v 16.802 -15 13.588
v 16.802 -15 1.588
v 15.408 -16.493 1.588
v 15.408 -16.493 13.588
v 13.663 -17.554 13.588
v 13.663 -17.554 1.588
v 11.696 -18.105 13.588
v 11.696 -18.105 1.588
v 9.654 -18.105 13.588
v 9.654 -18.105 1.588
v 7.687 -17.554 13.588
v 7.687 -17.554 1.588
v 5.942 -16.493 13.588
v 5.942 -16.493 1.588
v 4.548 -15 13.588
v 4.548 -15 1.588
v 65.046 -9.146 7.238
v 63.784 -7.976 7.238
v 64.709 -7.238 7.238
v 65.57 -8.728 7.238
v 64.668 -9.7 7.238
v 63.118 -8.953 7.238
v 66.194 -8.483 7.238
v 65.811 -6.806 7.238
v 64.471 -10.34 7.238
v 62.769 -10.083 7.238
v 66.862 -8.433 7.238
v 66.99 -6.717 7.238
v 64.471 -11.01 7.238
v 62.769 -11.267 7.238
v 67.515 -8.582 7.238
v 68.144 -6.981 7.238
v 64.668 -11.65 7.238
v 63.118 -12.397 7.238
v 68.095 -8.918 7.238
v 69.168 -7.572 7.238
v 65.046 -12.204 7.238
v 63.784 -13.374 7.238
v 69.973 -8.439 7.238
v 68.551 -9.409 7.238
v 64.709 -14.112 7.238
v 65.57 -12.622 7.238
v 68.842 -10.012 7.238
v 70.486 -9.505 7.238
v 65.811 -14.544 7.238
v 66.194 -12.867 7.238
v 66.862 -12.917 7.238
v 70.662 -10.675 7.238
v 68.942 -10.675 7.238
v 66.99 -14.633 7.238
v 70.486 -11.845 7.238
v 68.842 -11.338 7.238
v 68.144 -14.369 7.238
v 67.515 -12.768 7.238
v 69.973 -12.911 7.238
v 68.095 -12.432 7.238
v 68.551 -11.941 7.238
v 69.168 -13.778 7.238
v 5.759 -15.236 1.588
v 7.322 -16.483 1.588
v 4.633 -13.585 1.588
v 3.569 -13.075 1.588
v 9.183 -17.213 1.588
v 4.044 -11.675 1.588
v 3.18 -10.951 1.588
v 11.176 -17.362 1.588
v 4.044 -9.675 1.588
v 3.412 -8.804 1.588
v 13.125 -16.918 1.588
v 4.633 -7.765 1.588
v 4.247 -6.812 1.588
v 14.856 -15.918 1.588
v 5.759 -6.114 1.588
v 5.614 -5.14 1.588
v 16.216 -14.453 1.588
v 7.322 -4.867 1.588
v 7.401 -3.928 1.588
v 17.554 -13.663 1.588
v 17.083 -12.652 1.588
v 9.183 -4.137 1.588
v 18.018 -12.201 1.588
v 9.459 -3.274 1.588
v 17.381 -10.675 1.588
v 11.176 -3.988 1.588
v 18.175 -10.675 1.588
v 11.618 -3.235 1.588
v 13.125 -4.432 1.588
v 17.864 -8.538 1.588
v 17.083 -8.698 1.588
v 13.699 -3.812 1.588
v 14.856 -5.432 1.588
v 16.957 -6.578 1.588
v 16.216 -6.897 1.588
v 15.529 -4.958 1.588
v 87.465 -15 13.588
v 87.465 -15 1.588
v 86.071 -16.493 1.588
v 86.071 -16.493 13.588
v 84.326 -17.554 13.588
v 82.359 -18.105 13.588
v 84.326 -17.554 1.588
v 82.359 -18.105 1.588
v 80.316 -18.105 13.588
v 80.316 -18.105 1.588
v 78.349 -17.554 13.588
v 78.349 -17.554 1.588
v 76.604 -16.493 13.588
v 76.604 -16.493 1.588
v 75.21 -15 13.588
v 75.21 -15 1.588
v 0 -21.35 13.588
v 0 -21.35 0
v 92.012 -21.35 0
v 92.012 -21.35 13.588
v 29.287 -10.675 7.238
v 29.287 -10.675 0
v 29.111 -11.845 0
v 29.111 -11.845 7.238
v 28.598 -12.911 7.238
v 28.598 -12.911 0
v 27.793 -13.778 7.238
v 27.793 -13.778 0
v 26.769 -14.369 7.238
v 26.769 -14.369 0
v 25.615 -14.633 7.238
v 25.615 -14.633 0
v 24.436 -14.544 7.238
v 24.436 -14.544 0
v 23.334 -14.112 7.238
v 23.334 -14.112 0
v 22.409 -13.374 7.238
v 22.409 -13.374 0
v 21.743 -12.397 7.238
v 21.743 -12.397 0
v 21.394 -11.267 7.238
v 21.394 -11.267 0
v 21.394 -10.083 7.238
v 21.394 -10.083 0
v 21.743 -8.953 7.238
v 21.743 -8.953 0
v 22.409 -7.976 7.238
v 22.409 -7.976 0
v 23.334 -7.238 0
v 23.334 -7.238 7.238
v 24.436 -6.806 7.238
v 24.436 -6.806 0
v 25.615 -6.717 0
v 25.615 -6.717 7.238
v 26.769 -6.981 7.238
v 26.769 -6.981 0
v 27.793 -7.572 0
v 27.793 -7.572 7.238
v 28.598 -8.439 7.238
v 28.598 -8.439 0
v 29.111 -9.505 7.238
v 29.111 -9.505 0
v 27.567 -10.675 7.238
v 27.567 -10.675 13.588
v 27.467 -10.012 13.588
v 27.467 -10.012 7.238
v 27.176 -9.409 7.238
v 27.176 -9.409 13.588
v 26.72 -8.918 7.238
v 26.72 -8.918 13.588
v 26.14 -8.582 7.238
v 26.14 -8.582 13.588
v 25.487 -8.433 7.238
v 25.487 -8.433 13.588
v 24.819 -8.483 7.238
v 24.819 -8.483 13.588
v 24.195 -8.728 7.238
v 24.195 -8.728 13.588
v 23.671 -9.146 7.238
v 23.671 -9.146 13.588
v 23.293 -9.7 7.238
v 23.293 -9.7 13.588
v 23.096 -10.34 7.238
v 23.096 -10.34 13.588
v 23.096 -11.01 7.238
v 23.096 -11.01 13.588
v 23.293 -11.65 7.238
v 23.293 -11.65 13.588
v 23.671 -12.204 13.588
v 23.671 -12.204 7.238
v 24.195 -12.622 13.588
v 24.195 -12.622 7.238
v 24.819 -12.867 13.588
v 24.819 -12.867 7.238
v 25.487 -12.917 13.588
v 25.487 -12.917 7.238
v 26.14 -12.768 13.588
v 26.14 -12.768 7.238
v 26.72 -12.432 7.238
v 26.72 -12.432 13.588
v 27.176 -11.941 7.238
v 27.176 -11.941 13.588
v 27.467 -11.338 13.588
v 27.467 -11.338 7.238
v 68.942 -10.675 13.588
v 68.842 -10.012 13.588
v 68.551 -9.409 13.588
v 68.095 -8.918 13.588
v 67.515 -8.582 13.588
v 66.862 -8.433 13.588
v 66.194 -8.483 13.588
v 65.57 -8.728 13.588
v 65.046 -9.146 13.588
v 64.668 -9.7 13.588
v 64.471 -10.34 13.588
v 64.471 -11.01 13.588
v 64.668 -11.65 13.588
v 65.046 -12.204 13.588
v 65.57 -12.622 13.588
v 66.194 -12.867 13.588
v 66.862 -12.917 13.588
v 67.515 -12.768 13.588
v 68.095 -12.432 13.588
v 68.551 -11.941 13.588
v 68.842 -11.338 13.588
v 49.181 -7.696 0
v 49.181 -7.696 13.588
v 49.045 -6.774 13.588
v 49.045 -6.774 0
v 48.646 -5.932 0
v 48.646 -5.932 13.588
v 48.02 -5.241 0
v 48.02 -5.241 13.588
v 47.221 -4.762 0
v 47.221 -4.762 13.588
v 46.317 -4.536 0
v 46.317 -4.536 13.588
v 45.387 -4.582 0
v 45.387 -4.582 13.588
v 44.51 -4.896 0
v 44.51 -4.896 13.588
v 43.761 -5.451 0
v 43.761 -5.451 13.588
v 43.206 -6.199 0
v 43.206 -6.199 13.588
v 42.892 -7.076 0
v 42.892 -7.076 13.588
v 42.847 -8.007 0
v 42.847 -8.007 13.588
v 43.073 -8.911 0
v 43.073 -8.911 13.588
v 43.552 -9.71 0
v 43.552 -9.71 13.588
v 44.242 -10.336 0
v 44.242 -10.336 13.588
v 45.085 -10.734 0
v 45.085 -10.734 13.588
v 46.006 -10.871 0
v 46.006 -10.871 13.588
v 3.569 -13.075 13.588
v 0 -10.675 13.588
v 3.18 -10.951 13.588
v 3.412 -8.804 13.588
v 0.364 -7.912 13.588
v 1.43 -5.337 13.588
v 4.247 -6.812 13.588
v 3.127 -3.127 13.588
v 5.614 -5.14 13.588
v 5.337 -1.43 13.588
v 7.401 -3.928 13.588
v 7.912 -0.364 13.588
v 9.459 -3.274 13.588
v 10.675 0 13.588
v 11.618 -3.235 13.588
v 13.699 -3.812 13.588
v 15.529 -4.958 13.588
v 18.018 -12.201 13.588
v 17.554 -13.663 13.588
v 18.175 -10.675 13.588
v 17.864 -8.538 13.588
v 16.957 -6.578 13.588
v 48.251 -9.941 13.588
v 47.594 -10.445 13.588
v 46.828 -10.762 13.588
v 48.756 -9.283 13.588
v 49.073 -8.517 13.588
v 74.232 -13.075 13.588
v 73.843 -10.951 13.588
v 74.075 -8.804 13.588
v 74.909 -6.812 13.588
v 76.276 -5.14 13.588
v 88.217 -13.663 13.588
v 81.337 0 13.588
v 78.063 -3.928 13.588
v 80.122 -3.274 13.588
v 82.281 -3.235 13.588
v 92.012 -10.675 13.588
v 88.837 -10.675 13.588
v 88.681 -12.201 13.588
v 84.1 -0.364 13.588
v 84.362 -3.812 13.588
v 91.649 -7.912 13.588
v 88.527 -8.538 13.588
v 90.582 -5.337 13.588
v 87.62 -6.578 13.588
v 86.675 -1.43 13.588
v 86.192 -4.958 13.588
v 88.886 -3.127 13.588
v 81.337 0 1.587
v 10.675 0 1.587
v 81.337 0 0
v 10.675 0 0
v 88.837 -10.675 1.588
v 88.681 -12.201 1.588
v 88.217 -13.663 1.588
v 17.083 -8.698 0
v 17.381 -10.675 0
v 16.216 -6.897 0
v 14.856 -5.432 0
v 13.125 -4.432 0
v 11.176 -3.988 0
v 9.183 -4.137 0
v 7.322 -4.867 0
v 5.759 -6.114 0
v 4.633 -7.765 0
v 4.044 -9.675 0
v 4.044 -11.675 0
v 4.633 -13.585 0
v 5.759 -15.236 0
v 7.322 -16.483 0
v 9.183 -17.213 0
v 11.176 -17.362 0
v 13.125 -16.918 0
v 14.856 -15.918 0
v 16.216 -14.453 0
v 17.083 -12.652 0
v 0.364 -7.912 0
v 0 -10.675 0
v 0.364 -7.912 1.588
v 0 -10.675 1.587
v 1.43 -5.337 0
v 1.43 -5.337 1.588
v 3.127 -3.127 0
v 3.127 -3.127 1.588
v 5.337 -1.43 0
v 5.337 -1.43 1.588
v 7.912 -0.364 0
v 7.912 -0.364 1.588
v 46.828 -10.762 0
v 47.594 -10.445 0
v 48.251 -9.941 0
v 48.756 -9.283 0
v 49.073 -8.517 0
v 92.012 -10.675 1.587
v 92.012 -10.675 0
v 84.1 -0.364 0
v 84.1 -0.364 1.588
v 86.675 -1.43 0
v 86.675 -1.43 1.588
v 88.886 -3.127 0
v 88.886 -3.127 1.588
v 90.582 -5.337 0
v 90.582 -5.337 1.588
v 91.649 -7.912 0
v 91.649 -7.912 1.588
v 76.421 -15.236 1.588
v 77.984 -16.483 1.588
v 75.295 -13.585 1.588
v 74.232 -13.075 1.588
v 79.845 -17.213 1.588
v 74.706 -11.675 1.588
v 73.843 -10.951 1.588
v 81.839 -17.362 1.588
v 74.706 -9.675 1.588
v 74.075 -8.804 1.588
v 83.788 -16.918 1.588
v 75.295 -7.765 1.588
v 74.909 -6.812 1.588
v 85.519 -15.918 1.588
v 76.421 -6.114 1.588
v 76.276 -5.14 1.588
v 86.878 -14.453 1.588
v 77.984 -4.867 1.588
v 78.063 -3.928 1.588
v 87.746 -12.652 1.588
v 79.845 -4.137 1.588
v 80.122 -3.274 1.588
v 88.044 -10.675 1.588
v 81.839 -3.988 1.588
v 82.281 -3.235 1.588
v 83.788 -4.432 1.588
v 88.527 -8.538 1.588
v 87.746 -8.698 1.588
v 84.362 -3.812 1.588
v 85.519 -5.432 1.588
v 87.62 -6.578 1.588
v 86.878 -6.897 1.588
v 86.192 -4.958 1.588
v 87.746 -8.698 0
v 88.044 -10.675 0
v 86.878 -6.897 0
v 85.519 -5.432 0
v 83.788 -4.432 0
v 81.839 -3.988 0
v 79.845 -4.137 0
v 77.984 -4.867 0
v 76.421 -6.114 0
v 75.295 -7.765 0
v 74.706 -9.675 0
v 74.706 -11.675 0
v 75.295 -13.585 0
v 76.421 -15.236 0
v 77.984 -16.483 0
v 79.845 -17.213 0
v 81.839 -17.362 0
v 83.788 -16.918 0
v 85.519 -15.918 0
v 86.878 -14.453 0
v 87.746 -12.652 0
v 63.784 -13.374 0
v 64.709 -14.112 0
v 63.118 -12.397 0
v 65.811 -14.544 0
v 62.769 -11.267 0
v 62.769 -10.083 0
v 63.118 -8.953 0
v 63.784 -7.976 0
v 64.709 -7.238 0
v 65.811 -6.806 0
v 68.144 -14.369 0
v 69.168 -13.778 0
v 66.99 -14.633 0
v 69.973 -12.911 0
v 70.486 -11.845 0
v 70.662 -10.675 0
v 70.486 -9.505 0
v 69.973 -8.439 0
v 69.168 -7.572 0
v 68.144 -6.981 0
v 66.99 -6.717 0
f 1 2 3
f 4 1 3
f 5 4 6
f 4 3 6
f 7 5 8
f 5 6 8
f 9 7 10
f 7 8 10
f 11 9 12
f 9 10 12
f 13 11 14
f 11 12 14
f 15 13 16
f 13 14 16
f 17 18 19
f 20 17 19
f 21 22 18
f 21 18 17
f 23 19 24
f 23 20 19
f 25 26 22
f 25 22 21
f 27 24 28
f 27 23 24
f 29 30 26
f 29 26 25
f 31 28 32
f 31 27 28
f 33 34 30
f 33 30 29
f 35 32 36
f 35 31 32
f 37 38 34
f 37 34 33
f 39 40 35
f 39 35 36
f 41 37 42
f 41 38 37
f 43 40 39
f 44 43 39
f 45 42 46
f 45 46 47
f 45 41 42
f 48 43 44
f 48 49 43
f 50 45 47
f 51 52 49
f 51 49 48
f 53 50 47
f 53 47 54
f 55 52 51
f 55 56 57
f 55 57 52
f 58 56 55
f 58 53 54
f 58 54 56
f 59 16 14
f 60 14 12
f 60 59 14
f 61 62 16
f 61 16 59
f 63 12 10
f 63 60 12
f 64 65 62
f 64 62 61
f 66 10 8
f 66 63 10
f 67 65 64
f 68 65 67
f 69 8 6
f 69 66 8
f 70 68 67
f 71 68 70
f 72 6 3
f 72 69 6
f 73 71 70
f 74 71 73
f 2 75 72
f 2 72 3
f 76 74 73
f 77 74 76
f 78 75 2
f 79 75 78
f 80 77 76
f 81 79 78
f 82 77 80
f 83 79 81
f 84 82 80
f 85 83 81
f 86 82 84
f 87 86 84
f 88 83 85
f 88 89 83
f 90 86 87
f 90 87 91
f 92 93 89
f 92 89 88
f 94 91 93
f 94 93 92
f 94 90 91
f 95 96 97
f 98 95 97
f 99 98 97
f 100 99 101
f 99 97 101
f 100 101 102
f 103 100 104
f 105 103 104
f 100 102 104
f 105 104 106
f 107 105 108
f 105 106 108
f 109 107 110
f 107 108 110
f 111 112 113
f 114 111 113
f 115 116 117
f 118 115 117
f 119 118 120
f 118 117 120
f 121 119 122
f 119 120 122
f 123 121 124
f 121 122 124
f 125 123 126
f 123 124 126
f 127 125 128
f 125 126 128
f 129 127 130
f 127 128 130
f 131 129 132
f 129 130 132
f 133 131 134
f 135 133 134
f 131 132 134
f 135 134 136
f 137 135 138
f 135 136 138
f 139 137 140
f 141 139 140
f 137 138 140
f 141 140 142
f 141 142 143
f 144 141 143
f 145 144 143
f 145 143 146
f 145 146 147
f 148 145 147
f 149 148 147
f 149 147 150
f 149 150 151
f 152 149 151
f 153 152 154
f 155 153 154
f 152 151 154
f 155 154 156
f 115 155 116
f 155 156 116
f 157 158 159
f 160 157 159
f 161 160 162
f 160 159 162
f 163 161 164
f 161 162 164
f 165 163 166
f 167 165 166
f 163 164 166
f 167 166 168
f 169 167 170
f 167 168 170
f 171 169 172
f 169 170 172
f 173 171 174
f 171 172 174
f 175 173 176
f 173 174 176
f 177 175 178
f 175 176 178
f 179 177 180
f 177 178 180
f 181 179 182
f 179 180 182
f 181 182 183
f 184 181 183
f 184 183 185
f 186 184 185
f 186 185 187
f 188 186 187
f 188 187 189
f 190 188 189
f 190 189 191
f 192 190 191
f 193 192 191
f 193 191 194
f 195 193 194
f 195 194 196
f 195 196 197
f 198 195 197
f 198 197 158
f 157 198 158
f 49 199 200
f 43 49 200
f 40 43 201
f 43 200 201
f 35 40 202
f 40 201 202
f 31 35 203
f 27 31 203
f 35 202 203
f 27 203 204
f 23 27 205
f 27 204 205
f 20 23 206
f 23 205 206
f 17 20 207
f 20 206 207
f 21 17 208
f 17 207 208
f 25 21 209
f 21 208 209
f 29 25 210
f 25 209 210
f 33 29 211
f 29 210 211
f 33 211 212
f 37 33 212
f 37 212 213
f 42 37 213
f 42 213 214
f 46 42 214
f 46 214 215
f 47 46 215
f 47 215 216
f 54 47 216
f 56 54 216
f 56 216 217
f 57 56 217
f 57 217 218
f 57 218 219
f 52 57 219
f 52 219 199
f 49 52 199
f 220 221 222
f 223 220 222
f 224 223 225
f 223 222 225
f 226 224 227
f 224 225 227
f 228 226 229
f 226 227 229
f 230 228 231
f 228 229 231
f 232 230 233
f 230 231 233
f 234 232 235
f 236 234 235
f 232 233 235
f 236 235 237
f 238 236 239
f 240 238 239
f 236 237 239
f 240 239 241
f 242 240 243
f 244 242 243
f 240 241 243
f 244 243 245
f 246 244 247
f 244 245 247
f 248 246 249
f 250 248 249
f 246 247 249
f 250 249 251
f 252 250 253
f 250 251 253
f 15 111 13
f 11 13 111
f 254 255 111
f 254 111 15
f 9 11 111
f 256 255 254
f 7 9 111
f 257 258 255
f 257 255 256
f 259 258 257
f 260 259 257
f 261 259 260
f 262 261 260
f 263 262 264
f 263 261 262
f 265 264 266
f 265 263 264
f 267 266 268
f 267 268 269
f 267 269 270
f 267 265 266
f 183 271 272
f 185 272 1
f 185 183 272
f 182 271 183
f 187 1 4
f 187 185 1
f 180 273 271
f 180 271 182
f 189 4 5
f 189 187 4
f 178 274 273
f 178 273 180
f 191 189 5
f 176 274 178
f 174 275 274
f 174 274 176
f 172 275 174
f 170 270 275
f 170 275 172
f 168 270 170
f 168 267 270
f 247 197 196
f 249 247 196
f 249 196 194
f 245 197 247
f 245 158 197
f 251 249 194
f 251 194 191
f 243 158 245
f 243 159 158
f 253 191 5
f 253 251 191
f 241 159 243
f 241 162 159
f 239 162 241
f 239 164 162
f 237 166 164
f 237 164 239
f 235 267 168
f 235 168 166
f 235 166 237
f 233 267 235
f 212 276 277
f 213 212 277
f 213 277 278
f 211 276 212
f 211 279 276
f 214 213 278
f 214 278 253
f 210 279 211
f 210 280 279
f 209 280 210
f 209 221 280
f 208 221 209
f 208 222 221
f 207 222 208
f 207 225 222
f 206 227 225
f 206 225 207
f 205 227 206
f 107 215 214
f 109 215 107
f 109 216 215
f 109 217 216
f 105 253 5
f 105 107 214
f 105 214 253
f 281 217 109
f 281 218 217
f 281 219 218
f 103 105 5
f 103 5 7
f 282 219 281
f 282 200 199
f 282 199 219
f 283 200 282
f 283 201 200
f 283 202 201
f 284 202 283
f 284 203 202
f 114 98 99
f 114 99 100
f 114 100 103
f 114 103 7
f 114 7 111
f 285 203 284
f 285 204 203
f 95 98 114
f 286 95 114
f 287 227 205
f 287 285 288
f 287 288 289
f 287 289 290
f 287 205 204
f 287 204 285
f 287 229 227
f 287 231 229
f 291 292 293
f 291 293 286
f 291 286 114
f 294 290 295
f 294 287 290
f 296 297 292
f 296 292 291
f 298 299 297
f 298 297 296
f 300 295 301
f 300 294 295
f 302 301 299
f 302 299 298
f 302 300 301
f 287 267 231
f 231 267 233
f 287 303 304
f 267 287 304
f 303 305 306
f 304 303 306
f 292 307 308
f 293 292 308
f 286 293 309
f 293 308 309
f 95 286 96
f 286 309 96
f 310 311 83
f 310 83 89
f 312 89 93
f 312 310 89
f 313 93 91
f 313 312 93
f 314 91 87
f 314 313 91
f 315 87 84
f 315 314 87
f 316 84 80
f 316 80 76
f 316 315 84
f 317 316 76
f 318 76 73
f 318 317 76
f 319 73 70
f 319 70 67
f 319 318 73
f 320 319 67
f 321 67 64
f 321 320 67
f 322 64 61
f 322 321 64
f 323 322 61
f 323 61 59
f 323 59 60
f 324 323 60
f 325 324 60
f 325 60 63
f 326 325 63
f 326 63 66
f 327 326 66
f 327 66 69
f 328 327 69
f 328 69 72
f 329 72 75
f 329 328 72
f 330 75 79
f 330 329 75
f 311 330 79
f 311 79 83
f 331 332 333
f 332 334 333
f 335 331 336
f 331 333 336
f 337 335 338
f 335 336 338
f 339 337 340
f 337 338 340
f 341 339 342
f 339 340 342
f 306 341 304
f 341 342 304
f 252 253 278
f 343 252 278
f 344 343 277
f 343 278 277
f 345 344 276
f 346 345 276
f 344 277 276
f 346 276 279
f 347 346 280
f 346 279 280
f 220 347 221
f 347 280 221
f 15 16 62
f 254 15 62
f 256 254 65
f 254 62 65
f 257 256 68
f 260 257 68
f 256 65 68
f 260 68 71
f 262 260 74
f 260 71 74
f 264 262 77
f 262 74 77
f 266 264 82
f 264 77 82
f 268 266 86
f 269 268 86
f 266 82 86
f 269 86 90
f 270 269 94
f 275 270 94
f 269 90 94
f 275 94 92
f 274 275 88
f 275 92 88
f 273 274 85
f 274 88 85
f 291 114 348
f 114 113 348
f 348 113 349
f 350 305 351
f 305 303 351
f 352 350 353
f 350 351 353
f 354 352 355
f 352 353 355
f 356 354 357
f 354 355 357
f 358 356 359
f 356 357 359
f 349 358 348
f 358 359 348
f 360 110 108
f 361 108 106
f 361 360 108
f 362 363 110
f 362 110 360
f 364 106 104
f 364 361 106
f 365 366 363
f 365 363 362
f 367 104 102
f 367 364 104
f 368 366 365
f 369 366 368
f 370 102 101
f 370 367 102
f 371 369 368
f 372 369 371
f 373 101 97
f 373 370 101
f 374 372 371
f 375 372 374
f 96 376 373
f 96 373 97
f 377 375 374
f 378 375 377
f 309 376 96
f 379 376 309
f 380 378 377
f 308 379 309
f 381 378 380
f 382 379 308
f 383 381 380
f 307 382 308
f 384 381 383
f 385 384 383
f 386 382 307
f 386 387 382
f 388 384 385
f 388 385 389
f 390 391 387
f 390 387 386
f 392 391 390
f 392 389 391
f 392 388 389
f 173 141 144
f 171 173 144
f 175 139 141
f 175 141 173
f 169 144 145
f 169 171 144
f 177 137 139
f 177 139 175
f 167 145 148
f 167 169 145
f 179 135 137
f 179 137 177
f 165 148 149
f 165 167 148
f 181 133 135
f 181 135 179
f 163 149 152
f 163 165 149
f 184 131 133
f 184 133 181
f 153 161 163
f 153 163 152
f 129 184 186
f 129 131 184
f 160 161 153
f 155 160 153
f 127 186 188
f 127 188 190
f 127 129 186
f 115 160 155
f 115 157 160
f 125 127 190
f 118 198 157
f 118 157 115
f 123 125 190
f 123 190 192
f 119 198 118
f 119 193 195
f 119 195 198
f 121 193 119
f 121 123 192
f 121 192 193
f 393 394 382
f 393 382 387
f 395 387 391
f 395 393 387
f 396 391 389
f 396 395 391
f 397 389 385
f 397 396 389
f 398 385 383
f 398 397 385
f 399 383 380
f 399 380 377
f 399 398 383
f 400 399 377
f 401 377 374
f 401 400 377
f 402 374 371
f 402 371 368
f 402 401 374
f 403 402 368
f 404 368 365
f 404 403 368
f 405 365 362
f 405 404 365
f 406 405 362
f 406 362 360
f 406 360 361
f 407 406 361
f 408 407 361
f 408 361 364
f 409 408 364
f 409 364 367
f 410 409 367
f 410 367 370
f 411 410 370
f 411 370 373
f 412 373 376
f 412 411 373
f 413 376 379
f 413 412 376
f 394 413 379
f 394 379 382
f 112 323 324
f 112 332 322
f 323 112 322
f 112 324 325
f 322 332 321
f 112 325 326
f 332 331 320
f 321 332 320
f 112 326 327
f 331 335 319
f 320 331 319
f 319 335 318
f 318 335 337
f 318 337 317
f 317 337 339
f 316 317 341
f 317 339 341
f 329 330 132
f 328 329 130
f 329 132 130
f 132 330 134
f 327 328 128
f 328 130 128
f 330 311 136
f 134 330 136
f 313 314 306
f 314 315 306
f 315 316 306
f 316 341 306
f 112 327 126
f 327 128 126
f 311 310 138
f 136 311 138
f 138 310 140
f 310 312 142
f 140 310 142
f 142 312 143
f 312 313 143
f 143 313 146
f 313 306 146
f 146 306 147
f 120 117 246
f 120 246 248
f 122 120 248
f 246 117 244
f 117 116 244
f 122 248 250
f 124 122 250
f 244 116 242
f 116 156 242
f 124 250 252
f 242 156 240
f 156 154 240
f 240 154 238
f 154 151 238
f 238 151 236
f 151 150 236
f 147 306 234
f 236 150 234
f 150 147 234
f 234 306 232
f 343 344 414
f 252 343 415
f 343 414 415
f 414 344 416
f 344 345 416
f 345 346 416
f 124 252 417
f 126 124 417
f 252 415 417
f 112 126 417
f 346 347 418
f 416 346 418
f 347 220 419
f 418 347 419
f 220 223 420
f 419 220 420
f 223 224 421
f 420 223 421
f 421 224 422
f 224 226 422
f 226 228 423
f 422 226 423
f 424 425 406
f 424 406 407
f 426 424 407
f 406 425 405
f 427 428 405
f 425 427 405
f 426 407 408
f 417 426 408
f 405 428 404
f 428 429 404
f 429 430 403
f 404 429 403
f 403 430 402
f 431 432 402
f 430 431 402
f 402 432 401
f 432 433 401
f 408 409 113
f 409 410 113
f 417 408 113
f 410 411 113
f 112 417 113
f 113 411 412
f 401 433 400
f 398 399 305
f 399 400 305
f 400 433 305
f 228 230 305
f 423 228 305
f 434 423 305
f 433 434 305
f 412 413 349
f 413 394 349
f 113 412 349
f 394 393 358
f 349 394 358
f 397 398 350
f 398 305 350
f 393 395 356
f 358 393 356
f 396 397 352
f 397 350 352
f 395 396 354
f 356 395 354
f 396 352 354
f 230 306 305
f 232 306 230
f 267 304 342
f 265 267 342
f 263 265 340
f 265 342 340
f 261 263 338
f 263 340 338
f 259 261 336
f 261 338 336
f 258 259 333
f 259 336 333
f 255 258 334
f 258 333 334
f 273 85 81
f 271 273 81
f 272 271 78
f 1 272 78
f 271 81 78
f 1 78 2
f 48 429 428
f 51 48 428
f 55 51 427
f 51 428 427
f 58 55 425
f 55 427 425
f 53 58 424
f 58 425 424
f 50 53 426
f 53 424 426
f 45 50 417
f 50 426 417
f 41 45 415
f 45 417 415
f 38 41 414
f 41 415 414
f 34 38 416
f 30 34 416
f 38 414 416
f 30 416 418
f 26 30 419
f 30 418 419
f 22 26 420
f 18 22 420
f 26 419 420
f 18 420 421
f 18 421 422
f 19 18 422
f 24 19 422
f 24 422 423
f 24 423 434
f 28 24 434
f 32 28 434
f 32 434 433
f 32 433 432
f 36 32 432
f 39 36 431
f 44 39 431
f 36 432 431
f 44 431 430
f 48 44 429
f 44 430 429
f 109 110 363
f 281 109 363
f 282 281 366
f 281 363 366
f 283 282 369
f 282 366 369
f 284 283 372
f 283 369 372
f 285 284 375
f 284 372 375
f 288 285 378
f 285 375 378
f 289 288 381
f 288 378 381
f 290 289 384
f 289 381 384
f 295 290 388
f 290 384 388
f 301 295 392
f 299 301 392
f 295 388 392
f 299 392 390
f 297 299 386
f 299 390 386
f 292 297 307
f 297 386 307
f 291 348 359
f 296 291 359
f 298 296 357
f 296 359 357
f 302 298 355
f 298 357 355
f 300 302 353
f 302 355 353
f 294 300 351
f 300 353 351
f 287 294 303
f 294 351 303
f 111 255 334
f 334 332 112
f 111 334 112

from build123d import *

# Parameters (mm, degrees)
F0_W     = 92.0124906
F0_H     = 21.3499954
F0_R     = 6.7062477
F1_DEPTH = 1.5875
F2_R     = 10.6749977
F4_DEPTH = 12
F5_R     = 2.2479
F6_DEPTH = 13.5875
F7_R     = 3.96875
F8_DEPTH = 7.2375014


with BuildPart() as f1:
    # F0 (on Top) → F1 (new body)
    with BuildSketch(Plane.XY):
        with Locations((46.0062453, -10.6749977)):
            Rectangle(F0_W, F0_H)
        with Locations((10.6749977, -10.6749977)):
            Circle(F0_R, mode=Mode.SUBTRACT)
        with Locations((81.3374929, -10.6749977)):
            Circle(F0_R, mode=Mode.SUBTRACT)
    extrude(amount=F1_DEPTH)

    # F2
    f2_edges = [f1.edges().sort_by_distance(p)[0] for p in [
        (0, 0, 0.79375),
        (92.012491, 0, 0.79375),
    ]]
    fillet(f2_edges, radius=F2_R)

    # F3 (on face) → F4 (join)
    with BuildSketch(Plane.XY.offset(1.5875)):
        with BuildLine():
            Line((4.5476495872, -14.9999954), (0, -14.9999954))
            Line((0, -14.9999954), (0, -21.3499954))
            Line((0, -21.3499954), (92.0124906, -21.3499954))
            Line((92.0124906, -21.3499954), (92.0124906, -14.9999954))
            Line((92.0124906, -14.9999954), (87.4648410128, -14.9999954))
            ThreePointArc((87.4648410128, -14.9999954), (81.3374929, -18.1749977), (75.2101447872, -14.9999954))
            Line((75.2101447872, -14.9999954), (16.8023458128, -14.9999954))
            ThreePointArc((16.8023458128, -14.9999954), (10.6749977, -18.1749977), (4.5476495872, -14.9999954))
        make_face()
        with BuildLine():
            Line((0, -10.6749977), (0, -14.9999954))
            Line((0, -14.9999954), (4.5476495872, -14.9999954))
            ThreePointArc((4.5476495872, -14.9999954), (8.4061996532, -3.5263925617), (18.1749977, -10.6749977))
            ThreePointArc((18.1749977, -10.6749977), (17.8236028383, -12.9437957468), (16.8023458128, -14.9999954))
            Line((16.8023458128, -14.9999954), (75.2101447872, -14.9999954))
            ThreePointArc((75.2101447872, -14.9999954), (79.0686948532, -3.5263925617), (88.8374929, -10.6749977))
            ThreePointArc((88.8374929, -10.6749977), (88.4860980383, -12.9437957468), (87.4648410128, -14.9999954))
            Line((87.4648410128, -14.9999954), (92.0124906, -14.9999954))
            Line((92.0124906, -14.9999954), (92.0124906, -10.6749977))
            ThreePointArc((92.0124906, -10.6749977), (88.8858561628, -3.1266344372), (81.3374929, 0))
            Line((81.3374929, 0), (10.6749977, 0))
            ThreePointArc((10.6749977, 0), (3.1266344372, -3.1266344372), (0, -10.6749977))
        make_face()
    extrude(amount=F4_DEPTH)

    # F5 (on face) → F6 (cut, through all)
    with BuildSketch(Plane.XY.offset(13.5875)):
        with Locations((25.3187477, -10.6749977)):
            Circle(F5_R)
        with Locations((66.6937429, -10.6749977)):
            Circle(F5_R)
        with BuildLine():
            ThreePointArc((46.0062453, -10.8706539), (48.2513093303, -9.9407179303), (49.1812453, -7.6956539))
            ThreePointArc((49.1812453, -7.6956539), (43.7611812697, -5.4505898697), (46.0062453, -10.8706539))
        make_face()
    extrude(amount=-F6_DEPTH, mode=Mode.SUBTRACT)

    # F7 (on face) → F8 (cut)
    with BuildSketch(Plane(origin=(0, 0, 0), x_dir=(1, 0, 0), z_dir=(0, 0, -1))):
        with Locations((66.6937429, 10.6749977)):
            Circle(F7_R)
        with Locations((25.3187477, 10.6749977)):
            Circle(F7_R)
    extrude(amount=-F8_DEPTH, mode=Mode.SUBTRACT)


solid = f1.part
